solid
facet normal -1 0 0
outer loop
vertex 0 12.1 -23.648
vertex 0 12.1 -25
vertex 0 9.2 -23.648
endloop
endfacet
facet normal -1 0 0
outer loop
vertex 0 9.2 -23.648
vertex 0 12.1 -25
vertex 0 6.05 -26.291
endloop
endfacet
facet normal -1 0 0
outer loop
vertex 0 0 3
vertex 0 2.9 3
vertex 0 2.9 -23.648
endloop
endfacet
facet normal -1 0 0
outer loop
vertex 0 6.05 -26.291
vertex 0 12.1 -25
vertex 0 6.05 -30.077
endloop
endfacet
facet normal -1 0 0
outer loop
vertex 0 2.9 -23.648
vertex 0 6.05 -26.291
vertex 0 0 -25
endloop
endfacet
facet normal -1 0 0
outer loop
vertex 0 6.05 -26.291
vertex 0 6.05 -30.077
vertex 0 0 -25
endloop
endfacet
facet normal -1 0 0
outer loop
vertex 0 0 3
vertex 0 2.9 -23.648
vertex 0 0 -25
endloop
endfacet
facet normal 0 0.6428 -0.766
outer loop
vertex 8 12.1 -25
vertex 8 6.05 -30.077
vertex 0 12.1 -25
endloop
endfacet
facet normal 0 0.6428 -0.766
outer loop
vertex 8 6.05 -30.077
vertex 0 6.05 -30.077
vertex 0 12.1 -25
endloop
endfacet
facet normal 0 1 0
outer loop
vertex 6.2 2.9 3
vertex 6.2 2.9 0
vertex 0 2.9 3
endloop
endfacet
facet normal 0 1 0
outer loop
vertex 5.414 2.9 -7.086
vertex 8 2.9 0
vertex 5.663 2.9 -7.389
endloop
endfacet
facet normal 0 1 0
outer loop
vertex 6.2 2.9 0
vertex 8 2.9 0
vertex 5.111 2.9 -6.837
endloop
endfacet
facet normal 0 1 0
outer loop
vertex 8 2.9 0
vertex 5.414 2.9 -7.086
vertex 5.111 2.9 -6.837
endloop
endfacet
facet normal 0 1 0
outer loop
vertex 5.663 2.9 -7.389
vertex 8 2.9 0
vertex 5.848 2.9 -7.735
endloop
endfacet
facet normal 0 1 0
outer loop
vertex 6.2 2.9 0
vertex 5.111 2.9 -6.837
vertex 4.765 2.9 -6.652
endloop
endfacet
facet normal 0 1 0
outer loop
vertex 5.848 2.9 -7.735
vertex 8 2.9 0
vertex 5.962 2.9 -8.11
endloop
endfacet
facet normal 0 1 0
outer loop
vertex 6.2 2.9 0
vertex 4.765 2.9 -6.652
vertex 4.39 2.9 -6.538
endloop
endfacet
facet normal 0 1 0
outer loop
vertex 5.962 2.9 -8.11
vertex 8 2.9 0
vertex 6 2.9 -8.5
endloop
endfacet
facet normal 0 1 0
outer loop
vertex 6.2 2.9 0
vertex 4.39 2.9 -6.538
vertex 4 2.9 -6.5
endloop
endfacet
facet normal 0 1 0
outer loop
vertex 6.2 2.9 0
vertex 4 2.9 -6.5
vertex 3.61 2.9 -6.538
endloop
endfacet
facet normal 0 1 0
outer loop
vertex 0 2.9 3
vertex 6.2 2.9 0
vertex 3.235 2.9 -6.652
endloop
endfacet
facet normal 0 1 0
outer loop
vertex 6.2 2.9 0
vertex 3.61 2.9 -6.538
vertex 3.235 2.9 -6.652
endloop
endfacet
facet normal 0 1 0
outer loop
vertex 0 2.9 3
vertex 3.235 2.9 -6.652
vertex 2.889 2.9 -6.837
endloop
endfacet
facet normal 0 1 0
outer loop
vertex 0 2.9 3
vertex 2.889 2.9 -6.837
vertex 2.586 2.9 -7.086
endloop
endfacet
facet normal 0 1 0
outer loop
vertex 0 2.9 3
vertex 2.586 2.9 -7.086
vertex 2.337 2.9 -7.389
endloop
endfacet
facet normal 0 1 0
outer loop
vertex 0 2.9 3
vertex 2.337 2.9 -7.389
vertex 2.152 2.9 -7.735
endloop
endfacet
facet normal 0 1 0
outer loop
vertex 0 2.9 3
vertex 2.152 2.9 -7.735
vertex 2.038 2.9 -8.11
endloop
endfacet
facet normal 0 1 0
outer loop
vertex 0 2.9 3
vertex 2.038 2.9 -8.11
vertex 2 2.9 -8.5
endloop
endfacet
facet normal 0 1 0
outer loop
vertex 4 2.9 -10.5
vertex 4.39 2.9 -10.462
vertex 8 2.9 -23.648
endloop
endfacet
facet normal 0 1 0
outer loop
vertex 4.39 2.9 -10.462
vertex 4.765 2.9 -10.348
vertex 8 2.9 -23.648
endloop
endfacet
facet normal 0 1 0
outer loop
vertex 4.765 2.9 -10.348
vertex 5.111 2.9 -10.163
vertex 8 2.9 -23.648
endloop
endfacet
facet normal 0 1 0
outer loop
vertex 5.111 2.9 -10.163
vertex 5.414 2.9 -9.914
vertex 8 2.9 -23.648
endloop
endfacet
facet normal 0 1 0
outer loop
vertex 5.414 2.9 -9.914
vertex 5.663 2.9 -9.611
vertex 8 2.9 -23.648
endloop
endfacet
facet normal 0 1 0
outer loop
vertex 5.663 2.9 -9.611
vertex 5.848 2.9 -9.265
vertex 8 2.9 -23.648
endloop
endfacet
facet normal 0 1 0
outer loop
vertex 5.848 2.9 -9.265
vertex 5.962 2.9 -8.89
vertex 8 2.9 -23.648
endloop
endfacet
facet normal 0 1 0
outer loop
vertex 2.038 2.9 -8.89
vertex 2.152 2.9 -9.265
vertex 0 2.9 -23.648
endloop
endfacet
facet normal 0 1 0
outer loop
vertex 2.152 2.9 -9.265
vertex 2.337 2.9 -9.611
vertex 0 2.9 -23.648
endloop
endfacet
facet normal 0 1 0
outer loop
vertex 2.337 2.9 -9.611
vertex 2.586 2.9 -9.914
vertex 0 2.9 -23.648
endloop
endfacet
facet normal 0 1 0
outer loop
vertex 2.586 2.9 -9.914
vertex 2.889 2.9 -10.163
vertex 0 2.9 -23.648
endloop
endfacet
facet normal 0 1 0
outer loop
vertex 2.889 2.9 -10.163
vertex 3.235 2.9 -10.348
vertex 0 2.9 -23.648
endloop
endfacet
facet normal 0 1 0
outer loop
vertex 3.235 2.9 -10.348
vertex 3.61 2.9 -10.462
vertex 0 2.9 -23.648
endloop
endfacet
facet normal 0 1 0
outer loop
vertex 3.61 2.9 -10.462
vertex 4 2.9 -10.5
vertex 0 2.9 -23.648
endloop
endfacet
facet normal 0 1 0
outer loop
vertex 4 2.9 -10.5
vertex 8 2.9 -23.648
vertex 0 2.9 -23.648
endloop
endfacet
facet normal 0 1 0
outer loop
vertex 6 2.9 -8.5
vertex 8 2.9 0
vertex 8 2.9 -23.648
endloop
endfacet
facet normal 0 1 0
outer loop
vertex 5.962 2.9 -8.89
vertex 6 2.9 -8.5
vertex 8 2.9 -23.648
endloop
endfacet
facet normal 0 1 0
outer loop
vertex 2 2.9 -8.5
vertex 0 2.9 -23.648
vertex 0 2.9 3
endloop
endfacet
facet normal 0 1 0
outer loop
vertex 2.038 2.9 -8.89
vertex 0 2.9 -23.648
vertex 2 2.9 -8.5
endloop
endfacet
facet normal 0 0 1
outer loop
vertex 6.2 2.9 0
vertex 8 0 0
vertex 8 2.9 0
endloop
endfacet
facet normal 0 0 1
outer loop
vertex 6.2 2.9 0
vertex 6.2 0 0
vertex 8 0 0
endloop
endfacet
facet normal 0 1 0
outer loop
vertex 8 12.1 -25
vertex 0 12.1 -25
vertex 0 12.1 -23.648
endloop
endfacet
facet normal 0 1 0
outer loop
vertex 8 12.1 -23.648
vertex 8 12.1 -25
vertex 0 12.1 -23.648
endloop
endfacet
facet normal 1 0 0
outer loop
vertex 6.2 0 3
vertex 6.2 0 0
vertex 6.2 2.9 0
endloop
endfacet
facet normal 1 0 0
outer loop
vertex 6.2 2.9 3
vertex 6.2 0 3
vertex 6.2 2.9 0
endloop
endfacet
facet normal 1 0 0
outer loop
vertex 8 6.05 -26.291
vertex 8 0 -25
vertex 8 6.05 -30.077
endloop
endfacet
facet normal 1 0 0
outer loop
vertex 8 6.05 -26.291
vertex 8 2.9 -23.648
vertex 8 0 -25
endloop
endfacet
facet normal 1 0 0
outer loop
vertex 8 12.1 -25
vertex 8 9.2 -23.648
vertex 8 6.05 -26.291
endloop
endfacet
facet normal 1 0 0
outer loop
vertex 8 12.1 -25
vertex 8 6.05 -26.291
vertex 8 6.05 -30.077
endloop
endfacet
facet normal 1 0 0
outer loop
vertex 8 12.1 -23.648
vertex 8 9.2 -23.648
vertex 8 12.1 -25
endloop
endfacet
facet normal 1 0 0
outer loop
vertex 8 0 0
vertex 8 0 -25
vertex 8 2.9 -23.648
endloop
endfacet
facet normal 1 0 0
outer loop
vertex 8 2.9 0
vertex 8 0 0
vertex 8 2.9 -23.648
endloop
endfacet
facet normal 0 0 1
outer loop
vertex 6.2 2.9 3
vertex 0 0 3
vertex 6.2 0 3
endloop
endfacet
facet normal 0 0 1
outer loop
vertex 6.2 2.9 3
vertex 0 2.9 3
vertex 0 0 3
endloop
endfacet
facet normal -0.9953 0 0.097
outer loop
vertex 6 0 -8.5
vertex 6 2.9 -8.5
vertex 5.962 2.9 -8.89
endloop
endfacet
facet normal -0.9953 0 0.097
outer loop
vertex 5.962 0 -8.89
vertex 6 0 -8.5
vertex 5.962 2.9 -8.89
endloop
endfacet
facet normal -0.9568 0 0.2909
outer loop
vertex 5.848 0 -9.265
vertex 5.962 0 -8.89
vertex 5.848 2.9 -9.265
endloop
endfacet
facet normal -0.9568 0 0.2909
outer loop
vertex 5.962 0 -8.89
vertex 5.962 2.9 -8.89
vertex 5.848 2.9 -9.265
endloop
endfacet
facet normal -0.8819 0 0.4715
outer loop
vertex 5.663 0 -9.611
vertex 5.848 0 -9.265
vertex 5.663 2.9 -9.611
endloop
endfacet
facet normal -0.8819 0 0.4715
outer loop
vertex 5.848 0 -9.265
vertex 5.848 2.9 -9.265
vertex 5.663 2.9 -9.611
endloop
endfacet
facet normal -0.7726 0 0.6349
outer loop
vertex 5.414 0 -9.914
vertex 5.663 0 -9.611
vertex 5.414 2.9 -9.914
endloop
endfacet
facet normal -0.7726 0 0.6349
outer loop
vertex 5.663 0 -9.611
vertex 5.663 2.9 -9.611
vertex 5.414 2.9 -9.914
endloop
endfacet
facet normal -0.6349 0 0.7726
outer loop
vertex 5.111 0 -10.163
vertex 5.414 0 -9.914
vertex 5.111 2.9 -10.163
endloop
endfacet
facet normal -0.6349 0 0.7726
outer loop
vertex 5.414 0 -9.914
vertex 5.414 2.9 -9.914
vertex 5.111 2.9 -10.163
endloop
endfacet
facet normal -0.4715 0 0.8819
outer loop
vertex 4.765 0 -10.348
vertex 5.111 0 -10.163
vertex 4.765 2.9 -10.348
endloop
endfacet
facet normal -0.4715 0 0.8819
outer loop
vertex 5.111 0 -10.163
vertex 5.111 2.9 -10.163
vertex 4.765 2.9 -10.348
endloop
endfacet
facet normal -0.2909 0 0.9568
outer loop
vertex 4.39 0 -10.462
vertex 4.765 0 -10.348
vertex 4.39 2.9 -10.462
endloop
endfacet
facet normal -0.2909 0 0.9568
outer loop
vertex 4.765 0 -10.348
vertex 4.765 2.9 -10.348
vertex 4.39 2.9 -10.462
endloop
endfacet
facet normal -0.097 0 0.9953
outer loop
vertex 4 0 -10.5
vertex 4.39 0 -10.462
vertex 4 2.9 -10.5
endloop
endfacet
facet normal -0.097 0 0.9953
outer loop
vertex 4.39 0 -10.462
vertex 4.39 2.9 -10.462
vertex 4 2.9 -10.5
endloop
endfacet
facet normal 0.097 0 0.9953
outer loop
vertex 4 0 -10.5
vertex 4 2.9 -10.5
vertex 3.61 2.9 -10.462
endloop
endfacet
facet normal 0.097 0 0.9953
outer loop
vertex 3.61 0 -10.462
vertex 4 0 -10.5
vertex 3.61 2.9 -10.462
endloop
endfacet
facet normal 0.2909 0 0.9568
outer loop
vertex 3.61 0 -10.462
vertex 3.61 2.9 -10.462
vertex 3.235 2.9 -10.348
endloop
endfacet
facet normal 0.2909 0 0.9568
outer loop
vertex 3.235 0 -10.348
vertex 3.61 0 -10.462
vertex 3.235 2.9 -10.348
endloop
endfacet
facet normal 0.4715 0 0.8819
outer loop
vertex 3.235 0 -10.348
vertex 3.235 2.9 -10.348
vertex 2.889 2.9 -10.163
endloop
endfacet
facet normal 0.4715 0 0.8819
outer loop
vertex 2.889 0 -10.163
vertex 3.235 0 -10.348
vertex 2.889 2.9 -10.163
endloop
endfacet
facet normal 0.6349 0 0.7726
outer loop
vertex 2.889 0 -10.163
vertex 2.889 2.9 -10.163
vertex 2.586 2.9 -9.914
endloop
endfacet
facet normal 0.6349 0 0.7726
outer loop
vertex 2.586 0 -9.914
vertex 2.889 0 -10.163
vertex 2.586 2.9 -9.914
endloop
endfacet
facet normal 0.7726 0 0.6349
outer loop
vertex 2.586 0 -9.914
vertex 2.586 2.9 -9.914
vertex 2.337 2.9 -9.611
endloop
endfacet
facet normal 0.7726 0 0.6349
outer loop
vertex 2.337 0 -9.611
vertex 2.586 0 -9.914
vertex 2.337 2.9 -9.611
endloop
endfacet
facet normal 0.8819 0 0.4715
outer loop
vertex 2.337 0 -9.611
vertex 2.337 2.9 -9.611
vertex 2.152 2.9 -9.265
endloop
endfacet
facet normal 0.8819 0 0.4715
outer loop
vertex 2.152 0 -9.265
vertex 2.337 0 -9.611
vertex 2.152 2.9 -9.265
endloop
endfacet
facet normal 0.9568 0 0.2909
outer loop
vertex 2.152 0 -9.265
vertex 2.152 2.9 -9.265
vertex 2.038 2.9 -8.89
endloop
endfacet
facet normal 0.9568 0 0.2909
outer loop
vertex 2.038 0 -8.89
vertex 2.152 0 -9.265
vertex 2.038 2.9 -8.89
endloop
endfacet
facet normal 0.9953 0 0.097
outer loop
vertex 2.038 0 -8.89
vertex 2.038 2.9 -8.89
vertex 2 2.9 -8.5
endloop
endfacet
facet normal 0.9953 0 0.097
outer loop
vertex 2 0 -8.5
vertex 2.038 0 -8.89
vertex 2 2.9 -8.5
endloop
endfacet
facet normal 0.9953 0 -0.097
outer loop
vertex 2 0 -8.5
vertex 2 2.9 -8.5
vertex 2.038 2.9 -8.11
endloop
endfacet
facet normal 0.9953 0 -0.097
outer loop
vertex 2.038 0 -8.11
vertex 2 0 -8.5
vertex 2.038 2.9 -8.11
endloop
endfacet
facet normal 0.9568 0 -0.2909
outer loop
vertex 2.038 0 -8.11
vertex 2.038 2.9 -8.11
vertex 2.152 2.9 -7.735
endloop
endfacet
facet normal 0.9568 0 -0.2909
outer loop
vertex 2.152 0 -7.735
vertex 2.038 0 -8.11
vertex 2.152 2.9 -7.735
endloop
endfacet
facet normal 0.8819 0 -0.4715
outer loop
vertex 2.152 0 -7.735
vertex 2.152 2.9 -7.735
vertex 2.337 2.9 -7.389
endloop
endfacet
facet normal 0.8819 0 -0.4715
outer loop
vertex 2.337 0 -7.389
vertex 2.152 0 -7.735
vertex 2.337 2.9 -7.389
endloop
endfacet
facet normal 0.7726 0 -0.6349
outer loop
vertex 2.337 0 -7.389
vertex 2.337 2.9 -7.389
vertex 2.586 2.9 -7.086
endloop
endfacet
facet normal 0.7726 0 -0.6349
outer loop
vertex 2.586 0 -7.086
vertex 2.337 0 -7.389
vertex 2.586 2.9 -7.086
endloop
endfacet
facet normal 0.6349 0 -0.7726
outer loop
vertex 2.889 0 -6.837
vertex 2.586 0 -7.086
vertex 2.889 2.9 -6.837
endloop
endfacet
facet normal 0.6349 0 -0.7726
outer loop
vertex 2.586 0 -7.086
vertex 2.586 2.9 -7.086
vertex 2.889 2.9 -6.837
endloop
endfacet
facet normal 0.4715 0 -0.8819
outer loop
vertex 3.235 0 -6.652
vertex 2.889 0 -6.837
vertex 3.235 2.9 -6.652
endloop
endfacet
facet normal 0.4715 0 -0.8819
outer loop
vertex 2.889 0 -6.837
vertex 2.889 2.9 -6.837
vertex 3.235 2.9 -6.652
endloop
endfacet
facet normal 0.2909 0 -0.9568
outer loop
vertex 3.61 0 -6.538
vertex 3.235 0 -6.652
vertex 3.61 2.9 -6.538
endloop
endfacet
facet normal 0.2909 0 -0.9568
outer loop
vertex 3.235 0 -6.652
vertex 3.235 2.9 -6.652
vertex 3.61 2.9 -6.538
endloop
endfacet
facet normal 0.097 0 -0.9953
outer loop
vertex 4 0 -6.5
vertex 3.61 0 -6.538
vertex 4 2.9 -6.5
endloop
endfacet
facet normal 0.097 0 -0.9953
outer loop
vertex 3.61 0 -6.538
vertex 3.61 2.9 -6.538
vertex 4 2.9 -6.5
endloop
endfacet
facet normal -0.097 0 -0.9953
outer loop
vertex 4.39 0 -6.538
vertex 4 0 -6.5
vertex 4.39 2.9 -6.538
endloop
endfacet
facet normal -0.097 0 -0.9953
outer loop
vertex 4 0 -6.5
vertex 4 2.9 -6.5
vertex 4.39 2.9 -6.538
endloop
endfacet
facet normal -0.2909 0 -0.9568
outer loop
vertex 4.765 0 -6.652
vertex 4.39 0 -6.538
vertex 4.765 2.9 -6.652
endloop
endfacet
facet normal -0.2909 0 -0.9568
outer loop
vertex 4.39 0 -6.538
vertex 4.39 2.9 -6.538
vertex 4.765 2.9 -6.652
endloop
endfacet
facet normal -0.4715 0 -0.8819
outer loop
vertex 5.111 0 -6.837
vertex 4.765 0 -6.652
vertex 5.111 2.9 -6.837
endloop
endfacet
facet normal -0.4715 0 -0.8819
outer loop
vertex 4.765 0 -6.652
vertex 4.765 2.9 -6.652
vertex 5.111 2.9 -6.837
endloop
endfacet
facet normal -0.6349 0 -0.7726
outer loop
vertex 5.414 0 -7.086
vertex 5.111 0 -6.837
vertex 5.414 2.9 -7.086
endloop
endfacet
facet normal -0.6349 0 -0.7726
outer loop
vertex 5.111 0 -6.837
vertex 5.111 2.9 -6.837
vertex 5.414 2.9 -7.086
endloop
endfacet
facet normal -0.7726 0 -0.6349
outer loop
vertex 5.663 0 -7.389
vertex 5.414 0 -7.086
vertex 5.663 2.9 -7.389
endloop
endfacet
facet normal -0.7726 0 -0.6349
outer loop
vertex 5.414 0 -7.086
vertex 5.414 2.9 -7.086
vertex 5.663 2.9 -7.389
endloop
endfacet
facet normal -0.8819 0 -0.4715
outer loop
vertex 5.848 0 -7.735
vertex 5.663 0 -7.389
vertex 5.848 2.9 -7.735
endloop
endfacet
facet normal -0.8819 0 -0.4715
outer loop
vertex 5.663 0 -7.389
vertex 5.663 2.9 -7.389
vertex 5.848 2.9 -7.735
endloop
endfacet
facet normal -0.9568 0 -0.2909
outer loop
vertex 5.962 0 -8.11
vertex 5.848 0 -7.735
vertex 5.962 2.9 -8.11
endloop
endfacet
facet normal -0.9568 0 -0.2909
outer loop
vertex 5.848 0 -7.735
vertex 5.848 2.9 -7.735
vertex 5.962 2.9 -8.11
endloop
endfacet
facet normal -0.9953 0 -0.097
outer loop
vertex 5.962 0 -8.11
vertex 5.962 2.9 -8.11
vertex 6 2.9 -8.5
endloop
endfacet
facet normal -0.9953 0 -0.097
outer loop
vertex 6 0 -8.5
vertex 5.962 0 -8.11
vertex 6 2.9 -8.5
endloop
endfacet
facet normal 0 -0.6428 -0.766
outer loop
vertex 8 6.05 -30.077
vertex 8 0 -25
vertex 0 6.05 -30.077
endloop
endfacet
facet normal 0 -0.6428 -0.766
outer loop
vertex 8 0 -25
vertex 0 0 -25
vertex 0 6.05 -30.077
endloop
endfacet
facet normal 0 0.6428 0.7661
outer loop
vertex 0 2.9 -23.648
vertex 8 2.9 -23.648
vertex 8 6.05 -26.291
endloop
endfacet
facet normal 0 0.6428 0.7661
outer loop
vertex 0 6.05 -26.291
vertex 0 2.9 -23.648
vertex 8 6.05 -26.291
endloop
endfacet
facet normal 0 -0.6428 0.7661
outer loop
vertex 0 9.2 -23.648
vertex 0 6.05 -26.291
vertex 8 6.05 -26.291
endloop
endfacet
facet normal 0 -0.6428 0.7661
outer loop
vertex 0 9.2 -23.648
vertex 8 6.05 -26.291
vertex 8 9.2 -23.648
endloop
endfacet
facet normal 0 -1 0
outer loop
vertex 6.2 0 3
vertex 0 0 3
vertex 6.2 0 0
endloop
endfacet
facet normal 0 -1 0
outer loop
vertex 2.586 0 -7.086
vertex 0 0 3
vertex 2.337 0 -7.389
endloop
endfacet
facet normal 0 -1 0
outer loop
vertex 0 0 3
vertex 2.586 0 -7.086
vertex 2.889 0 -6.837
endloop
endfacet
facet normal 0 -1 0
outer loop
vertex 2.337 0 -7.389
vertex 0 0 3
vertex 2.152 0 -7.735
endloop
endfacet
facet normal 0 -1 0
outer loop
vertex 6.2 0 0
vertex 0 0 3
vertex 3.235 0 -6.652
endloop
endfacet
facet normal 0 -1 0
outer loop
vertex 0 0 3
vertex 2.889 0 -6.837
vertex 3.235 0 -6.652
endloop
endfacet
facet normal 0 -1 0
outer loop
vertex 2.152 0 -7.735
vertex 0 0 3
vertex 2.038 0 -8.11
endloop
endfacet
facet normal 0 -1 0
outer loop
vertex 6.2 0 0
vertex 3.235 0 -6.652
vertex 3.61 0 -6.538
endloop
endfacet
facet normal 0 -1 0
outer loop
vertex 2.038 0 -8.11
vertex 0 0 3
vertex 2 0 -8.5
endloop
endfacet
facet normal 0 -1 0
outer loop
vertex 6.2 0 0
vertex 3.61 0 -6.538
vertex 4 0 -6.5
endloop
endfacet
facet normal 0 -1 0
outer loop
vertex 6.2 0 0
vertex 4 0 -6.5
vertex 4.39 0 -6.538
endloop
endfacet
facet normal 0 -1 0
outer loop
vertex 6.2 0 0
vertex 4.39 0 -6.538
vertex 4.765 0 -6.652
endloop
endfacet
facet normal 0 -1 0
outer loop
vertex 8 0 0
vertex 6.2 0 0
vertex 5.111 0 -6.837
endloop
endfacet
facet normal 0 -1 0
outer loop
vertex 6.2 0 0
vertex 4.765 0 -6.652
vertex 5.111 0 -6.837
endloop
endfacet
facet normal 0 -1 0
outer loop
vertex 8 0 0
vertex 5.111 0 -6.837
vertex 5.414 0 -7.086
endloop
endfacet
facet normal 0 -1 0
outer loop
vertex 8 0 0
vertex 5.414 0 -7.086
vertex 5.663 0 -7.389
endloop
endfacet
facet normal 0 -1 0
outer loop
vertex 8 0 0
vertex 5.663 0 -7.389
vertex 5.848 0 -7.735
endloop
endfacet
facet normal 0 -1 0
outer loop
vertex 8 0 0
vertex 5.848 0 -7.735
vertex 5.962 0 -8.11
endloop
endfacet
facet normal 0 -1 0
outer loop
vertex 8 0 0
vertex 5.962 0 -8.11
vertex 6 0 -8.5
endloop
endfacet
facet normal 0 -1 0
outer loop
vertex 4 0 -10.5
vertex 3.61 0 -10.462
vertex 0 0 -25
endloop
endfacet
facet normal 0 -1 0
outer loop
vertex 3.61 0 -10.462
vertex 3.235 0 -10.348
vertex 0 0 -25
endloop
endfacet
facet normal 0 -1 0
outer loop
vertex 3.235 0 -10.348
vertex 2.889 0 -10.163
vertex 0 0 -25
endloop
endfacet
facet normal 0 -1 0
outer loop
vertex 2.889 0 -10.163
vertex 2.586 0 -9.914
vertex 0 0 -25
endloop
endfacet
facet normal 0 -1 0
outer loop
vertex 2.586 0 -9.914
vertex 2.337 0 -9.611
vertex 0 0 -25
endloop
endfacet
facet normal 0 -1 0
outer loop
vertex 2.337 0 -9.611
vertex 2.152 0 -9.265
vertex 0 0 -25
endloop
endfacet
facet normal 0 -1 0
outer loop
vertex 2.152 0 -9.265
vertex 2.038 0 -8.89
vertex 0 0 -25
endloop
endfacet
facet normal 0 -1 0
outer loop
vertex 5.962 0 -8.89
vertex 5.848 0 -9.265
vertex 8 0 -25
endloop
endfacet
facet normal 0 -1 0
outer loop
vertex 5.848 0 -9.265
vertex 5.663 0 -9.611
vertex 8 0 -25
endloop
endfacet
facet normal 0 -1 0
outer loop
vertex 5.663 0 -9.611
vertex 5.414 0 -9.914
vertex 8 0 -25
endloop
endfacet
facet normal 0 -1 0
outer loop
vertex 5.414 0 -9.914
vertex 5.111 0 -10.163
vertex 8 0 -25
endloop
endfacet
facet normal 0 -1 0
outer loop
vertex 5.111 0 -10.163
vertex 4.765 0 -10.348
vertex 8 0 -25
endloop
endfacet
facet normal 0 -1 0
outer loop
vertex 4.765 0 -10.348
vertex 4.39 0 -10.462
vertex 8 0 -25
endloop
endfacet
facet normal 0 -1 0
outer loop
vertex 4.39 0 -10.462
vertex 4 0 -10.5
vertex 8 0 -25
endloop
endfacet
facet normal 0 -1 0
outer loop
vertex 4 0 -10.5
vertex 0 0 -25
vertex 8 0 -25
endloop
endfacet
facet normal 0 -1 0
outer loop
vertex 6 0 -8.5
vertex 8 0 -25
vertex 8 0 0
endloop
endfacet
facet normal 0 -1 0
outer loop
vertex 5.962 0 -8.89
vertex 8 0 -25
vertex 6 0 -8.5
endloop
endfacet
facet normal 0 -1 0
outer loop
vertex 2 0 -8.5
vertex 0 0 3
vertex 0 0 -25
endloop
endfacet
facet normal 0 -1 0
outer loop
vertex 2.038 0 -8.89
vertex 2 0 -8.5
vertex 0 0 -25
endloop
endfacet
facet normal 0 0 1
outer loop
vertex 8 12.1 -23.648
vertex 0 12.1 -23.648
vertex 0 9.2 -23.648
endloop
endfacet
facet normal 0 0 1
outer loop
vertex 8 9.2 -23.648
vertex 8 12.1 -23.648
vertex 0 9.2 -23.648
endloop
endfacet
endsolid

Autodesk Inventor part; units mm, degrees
ref_plane "YZ Plane" through (0, 0, 0) normal (1, 0, 0) x (0, 1, 0)
ref_plane "XZ Plane" through (0, 0, 0) normal (0, 1, 0) x (-1, 0, 0)
ref_plane "XY Plane" through (0, 0, 0) normal (0, 0, 1) x (1, 0, 0)
sketch "Sketch1" plane through (0, 0, 0) normal (1, 0, 0) x (0, 1, 0)
  line L0 (0, 0) -> (2.9, 0)
  line L1 (2.9, 0) -> (2.9, -25)
  line L2 (2.9, -25) -> (0, -25)
  line L3 (0, -25) -> (0, 0)
  line L4 (0, -25) -> (6.05, -30.0766)
  line L5 (2.9, -23.6477) -> (6.05, -26.2909)
  line L6 (6.05, -30.0766) -> (6.05, -26.2909)
  line L7 (6.05, -26.2909) -> (9.2, -23.6477)
  line L8 (6.05, -30.0766) -> (12.1, -25)
  line L9 (9.2, -27.4334) -> (9.2, -23.6477)
  line L10 (7.5884, -25) -> (12.1, -25)
  line L11 (12.1, -25) -> (12.1, -23.6477)
  line L12 (12.1, -23.6477) -> (9.2, -23.6477)
  dimension "d0" = 2.9
  dimension "d1" = 25
  dimension "d2" = 50
  dimension "d3" = 3.15
  dimension "d4" = 2.9
  dimension "d5" = 50
  dimension "d6" = 3.15
extrude "Extrusion1" add sketch "Sketch1" along normal blind 8
sketch "Sketch2" plane through (0, 0, 0) normal (0, 0, 1) x (1, 0, 0)
  line L0 (0, 0) -> (8, 0) projected
  line L1 (0, 0) -> (6.2, 0)
  line L2 (6.2, 0) -> (6.2, 2.9)
  line L3 (6.2, 2.9) -> (0, 2.9)
  line L4 (0, 2.9) -> (0, 0)
  dimension "d11" = 6.2
extrude "Extrusion2" add sketch "Sketch2" along normal blind 3
sketch "Sketch3" plane through (0, 2.9, -23.6477) normal (0, 1, 0) x (1, 0, 0)
  line L0 (6.2, -23.6477) -> (8, -23.6477) projected
  line L1 (0, -23.6477) -> (8, -23.6477)
  line L2 (4, -23.6477) -> (4, -15.1477)
  circle A0 centre (4, -15.1477) radius 2
  dimension "d14" = 8.5
  dimension "d15" = 4
extrude "Extrusion3" cut sketch "Sketch3" against normal through all
equation "\"d6\" = d3"
properties part number "Cap Pulley Support V2 Pt1" material "Thermoplastic Resin"
